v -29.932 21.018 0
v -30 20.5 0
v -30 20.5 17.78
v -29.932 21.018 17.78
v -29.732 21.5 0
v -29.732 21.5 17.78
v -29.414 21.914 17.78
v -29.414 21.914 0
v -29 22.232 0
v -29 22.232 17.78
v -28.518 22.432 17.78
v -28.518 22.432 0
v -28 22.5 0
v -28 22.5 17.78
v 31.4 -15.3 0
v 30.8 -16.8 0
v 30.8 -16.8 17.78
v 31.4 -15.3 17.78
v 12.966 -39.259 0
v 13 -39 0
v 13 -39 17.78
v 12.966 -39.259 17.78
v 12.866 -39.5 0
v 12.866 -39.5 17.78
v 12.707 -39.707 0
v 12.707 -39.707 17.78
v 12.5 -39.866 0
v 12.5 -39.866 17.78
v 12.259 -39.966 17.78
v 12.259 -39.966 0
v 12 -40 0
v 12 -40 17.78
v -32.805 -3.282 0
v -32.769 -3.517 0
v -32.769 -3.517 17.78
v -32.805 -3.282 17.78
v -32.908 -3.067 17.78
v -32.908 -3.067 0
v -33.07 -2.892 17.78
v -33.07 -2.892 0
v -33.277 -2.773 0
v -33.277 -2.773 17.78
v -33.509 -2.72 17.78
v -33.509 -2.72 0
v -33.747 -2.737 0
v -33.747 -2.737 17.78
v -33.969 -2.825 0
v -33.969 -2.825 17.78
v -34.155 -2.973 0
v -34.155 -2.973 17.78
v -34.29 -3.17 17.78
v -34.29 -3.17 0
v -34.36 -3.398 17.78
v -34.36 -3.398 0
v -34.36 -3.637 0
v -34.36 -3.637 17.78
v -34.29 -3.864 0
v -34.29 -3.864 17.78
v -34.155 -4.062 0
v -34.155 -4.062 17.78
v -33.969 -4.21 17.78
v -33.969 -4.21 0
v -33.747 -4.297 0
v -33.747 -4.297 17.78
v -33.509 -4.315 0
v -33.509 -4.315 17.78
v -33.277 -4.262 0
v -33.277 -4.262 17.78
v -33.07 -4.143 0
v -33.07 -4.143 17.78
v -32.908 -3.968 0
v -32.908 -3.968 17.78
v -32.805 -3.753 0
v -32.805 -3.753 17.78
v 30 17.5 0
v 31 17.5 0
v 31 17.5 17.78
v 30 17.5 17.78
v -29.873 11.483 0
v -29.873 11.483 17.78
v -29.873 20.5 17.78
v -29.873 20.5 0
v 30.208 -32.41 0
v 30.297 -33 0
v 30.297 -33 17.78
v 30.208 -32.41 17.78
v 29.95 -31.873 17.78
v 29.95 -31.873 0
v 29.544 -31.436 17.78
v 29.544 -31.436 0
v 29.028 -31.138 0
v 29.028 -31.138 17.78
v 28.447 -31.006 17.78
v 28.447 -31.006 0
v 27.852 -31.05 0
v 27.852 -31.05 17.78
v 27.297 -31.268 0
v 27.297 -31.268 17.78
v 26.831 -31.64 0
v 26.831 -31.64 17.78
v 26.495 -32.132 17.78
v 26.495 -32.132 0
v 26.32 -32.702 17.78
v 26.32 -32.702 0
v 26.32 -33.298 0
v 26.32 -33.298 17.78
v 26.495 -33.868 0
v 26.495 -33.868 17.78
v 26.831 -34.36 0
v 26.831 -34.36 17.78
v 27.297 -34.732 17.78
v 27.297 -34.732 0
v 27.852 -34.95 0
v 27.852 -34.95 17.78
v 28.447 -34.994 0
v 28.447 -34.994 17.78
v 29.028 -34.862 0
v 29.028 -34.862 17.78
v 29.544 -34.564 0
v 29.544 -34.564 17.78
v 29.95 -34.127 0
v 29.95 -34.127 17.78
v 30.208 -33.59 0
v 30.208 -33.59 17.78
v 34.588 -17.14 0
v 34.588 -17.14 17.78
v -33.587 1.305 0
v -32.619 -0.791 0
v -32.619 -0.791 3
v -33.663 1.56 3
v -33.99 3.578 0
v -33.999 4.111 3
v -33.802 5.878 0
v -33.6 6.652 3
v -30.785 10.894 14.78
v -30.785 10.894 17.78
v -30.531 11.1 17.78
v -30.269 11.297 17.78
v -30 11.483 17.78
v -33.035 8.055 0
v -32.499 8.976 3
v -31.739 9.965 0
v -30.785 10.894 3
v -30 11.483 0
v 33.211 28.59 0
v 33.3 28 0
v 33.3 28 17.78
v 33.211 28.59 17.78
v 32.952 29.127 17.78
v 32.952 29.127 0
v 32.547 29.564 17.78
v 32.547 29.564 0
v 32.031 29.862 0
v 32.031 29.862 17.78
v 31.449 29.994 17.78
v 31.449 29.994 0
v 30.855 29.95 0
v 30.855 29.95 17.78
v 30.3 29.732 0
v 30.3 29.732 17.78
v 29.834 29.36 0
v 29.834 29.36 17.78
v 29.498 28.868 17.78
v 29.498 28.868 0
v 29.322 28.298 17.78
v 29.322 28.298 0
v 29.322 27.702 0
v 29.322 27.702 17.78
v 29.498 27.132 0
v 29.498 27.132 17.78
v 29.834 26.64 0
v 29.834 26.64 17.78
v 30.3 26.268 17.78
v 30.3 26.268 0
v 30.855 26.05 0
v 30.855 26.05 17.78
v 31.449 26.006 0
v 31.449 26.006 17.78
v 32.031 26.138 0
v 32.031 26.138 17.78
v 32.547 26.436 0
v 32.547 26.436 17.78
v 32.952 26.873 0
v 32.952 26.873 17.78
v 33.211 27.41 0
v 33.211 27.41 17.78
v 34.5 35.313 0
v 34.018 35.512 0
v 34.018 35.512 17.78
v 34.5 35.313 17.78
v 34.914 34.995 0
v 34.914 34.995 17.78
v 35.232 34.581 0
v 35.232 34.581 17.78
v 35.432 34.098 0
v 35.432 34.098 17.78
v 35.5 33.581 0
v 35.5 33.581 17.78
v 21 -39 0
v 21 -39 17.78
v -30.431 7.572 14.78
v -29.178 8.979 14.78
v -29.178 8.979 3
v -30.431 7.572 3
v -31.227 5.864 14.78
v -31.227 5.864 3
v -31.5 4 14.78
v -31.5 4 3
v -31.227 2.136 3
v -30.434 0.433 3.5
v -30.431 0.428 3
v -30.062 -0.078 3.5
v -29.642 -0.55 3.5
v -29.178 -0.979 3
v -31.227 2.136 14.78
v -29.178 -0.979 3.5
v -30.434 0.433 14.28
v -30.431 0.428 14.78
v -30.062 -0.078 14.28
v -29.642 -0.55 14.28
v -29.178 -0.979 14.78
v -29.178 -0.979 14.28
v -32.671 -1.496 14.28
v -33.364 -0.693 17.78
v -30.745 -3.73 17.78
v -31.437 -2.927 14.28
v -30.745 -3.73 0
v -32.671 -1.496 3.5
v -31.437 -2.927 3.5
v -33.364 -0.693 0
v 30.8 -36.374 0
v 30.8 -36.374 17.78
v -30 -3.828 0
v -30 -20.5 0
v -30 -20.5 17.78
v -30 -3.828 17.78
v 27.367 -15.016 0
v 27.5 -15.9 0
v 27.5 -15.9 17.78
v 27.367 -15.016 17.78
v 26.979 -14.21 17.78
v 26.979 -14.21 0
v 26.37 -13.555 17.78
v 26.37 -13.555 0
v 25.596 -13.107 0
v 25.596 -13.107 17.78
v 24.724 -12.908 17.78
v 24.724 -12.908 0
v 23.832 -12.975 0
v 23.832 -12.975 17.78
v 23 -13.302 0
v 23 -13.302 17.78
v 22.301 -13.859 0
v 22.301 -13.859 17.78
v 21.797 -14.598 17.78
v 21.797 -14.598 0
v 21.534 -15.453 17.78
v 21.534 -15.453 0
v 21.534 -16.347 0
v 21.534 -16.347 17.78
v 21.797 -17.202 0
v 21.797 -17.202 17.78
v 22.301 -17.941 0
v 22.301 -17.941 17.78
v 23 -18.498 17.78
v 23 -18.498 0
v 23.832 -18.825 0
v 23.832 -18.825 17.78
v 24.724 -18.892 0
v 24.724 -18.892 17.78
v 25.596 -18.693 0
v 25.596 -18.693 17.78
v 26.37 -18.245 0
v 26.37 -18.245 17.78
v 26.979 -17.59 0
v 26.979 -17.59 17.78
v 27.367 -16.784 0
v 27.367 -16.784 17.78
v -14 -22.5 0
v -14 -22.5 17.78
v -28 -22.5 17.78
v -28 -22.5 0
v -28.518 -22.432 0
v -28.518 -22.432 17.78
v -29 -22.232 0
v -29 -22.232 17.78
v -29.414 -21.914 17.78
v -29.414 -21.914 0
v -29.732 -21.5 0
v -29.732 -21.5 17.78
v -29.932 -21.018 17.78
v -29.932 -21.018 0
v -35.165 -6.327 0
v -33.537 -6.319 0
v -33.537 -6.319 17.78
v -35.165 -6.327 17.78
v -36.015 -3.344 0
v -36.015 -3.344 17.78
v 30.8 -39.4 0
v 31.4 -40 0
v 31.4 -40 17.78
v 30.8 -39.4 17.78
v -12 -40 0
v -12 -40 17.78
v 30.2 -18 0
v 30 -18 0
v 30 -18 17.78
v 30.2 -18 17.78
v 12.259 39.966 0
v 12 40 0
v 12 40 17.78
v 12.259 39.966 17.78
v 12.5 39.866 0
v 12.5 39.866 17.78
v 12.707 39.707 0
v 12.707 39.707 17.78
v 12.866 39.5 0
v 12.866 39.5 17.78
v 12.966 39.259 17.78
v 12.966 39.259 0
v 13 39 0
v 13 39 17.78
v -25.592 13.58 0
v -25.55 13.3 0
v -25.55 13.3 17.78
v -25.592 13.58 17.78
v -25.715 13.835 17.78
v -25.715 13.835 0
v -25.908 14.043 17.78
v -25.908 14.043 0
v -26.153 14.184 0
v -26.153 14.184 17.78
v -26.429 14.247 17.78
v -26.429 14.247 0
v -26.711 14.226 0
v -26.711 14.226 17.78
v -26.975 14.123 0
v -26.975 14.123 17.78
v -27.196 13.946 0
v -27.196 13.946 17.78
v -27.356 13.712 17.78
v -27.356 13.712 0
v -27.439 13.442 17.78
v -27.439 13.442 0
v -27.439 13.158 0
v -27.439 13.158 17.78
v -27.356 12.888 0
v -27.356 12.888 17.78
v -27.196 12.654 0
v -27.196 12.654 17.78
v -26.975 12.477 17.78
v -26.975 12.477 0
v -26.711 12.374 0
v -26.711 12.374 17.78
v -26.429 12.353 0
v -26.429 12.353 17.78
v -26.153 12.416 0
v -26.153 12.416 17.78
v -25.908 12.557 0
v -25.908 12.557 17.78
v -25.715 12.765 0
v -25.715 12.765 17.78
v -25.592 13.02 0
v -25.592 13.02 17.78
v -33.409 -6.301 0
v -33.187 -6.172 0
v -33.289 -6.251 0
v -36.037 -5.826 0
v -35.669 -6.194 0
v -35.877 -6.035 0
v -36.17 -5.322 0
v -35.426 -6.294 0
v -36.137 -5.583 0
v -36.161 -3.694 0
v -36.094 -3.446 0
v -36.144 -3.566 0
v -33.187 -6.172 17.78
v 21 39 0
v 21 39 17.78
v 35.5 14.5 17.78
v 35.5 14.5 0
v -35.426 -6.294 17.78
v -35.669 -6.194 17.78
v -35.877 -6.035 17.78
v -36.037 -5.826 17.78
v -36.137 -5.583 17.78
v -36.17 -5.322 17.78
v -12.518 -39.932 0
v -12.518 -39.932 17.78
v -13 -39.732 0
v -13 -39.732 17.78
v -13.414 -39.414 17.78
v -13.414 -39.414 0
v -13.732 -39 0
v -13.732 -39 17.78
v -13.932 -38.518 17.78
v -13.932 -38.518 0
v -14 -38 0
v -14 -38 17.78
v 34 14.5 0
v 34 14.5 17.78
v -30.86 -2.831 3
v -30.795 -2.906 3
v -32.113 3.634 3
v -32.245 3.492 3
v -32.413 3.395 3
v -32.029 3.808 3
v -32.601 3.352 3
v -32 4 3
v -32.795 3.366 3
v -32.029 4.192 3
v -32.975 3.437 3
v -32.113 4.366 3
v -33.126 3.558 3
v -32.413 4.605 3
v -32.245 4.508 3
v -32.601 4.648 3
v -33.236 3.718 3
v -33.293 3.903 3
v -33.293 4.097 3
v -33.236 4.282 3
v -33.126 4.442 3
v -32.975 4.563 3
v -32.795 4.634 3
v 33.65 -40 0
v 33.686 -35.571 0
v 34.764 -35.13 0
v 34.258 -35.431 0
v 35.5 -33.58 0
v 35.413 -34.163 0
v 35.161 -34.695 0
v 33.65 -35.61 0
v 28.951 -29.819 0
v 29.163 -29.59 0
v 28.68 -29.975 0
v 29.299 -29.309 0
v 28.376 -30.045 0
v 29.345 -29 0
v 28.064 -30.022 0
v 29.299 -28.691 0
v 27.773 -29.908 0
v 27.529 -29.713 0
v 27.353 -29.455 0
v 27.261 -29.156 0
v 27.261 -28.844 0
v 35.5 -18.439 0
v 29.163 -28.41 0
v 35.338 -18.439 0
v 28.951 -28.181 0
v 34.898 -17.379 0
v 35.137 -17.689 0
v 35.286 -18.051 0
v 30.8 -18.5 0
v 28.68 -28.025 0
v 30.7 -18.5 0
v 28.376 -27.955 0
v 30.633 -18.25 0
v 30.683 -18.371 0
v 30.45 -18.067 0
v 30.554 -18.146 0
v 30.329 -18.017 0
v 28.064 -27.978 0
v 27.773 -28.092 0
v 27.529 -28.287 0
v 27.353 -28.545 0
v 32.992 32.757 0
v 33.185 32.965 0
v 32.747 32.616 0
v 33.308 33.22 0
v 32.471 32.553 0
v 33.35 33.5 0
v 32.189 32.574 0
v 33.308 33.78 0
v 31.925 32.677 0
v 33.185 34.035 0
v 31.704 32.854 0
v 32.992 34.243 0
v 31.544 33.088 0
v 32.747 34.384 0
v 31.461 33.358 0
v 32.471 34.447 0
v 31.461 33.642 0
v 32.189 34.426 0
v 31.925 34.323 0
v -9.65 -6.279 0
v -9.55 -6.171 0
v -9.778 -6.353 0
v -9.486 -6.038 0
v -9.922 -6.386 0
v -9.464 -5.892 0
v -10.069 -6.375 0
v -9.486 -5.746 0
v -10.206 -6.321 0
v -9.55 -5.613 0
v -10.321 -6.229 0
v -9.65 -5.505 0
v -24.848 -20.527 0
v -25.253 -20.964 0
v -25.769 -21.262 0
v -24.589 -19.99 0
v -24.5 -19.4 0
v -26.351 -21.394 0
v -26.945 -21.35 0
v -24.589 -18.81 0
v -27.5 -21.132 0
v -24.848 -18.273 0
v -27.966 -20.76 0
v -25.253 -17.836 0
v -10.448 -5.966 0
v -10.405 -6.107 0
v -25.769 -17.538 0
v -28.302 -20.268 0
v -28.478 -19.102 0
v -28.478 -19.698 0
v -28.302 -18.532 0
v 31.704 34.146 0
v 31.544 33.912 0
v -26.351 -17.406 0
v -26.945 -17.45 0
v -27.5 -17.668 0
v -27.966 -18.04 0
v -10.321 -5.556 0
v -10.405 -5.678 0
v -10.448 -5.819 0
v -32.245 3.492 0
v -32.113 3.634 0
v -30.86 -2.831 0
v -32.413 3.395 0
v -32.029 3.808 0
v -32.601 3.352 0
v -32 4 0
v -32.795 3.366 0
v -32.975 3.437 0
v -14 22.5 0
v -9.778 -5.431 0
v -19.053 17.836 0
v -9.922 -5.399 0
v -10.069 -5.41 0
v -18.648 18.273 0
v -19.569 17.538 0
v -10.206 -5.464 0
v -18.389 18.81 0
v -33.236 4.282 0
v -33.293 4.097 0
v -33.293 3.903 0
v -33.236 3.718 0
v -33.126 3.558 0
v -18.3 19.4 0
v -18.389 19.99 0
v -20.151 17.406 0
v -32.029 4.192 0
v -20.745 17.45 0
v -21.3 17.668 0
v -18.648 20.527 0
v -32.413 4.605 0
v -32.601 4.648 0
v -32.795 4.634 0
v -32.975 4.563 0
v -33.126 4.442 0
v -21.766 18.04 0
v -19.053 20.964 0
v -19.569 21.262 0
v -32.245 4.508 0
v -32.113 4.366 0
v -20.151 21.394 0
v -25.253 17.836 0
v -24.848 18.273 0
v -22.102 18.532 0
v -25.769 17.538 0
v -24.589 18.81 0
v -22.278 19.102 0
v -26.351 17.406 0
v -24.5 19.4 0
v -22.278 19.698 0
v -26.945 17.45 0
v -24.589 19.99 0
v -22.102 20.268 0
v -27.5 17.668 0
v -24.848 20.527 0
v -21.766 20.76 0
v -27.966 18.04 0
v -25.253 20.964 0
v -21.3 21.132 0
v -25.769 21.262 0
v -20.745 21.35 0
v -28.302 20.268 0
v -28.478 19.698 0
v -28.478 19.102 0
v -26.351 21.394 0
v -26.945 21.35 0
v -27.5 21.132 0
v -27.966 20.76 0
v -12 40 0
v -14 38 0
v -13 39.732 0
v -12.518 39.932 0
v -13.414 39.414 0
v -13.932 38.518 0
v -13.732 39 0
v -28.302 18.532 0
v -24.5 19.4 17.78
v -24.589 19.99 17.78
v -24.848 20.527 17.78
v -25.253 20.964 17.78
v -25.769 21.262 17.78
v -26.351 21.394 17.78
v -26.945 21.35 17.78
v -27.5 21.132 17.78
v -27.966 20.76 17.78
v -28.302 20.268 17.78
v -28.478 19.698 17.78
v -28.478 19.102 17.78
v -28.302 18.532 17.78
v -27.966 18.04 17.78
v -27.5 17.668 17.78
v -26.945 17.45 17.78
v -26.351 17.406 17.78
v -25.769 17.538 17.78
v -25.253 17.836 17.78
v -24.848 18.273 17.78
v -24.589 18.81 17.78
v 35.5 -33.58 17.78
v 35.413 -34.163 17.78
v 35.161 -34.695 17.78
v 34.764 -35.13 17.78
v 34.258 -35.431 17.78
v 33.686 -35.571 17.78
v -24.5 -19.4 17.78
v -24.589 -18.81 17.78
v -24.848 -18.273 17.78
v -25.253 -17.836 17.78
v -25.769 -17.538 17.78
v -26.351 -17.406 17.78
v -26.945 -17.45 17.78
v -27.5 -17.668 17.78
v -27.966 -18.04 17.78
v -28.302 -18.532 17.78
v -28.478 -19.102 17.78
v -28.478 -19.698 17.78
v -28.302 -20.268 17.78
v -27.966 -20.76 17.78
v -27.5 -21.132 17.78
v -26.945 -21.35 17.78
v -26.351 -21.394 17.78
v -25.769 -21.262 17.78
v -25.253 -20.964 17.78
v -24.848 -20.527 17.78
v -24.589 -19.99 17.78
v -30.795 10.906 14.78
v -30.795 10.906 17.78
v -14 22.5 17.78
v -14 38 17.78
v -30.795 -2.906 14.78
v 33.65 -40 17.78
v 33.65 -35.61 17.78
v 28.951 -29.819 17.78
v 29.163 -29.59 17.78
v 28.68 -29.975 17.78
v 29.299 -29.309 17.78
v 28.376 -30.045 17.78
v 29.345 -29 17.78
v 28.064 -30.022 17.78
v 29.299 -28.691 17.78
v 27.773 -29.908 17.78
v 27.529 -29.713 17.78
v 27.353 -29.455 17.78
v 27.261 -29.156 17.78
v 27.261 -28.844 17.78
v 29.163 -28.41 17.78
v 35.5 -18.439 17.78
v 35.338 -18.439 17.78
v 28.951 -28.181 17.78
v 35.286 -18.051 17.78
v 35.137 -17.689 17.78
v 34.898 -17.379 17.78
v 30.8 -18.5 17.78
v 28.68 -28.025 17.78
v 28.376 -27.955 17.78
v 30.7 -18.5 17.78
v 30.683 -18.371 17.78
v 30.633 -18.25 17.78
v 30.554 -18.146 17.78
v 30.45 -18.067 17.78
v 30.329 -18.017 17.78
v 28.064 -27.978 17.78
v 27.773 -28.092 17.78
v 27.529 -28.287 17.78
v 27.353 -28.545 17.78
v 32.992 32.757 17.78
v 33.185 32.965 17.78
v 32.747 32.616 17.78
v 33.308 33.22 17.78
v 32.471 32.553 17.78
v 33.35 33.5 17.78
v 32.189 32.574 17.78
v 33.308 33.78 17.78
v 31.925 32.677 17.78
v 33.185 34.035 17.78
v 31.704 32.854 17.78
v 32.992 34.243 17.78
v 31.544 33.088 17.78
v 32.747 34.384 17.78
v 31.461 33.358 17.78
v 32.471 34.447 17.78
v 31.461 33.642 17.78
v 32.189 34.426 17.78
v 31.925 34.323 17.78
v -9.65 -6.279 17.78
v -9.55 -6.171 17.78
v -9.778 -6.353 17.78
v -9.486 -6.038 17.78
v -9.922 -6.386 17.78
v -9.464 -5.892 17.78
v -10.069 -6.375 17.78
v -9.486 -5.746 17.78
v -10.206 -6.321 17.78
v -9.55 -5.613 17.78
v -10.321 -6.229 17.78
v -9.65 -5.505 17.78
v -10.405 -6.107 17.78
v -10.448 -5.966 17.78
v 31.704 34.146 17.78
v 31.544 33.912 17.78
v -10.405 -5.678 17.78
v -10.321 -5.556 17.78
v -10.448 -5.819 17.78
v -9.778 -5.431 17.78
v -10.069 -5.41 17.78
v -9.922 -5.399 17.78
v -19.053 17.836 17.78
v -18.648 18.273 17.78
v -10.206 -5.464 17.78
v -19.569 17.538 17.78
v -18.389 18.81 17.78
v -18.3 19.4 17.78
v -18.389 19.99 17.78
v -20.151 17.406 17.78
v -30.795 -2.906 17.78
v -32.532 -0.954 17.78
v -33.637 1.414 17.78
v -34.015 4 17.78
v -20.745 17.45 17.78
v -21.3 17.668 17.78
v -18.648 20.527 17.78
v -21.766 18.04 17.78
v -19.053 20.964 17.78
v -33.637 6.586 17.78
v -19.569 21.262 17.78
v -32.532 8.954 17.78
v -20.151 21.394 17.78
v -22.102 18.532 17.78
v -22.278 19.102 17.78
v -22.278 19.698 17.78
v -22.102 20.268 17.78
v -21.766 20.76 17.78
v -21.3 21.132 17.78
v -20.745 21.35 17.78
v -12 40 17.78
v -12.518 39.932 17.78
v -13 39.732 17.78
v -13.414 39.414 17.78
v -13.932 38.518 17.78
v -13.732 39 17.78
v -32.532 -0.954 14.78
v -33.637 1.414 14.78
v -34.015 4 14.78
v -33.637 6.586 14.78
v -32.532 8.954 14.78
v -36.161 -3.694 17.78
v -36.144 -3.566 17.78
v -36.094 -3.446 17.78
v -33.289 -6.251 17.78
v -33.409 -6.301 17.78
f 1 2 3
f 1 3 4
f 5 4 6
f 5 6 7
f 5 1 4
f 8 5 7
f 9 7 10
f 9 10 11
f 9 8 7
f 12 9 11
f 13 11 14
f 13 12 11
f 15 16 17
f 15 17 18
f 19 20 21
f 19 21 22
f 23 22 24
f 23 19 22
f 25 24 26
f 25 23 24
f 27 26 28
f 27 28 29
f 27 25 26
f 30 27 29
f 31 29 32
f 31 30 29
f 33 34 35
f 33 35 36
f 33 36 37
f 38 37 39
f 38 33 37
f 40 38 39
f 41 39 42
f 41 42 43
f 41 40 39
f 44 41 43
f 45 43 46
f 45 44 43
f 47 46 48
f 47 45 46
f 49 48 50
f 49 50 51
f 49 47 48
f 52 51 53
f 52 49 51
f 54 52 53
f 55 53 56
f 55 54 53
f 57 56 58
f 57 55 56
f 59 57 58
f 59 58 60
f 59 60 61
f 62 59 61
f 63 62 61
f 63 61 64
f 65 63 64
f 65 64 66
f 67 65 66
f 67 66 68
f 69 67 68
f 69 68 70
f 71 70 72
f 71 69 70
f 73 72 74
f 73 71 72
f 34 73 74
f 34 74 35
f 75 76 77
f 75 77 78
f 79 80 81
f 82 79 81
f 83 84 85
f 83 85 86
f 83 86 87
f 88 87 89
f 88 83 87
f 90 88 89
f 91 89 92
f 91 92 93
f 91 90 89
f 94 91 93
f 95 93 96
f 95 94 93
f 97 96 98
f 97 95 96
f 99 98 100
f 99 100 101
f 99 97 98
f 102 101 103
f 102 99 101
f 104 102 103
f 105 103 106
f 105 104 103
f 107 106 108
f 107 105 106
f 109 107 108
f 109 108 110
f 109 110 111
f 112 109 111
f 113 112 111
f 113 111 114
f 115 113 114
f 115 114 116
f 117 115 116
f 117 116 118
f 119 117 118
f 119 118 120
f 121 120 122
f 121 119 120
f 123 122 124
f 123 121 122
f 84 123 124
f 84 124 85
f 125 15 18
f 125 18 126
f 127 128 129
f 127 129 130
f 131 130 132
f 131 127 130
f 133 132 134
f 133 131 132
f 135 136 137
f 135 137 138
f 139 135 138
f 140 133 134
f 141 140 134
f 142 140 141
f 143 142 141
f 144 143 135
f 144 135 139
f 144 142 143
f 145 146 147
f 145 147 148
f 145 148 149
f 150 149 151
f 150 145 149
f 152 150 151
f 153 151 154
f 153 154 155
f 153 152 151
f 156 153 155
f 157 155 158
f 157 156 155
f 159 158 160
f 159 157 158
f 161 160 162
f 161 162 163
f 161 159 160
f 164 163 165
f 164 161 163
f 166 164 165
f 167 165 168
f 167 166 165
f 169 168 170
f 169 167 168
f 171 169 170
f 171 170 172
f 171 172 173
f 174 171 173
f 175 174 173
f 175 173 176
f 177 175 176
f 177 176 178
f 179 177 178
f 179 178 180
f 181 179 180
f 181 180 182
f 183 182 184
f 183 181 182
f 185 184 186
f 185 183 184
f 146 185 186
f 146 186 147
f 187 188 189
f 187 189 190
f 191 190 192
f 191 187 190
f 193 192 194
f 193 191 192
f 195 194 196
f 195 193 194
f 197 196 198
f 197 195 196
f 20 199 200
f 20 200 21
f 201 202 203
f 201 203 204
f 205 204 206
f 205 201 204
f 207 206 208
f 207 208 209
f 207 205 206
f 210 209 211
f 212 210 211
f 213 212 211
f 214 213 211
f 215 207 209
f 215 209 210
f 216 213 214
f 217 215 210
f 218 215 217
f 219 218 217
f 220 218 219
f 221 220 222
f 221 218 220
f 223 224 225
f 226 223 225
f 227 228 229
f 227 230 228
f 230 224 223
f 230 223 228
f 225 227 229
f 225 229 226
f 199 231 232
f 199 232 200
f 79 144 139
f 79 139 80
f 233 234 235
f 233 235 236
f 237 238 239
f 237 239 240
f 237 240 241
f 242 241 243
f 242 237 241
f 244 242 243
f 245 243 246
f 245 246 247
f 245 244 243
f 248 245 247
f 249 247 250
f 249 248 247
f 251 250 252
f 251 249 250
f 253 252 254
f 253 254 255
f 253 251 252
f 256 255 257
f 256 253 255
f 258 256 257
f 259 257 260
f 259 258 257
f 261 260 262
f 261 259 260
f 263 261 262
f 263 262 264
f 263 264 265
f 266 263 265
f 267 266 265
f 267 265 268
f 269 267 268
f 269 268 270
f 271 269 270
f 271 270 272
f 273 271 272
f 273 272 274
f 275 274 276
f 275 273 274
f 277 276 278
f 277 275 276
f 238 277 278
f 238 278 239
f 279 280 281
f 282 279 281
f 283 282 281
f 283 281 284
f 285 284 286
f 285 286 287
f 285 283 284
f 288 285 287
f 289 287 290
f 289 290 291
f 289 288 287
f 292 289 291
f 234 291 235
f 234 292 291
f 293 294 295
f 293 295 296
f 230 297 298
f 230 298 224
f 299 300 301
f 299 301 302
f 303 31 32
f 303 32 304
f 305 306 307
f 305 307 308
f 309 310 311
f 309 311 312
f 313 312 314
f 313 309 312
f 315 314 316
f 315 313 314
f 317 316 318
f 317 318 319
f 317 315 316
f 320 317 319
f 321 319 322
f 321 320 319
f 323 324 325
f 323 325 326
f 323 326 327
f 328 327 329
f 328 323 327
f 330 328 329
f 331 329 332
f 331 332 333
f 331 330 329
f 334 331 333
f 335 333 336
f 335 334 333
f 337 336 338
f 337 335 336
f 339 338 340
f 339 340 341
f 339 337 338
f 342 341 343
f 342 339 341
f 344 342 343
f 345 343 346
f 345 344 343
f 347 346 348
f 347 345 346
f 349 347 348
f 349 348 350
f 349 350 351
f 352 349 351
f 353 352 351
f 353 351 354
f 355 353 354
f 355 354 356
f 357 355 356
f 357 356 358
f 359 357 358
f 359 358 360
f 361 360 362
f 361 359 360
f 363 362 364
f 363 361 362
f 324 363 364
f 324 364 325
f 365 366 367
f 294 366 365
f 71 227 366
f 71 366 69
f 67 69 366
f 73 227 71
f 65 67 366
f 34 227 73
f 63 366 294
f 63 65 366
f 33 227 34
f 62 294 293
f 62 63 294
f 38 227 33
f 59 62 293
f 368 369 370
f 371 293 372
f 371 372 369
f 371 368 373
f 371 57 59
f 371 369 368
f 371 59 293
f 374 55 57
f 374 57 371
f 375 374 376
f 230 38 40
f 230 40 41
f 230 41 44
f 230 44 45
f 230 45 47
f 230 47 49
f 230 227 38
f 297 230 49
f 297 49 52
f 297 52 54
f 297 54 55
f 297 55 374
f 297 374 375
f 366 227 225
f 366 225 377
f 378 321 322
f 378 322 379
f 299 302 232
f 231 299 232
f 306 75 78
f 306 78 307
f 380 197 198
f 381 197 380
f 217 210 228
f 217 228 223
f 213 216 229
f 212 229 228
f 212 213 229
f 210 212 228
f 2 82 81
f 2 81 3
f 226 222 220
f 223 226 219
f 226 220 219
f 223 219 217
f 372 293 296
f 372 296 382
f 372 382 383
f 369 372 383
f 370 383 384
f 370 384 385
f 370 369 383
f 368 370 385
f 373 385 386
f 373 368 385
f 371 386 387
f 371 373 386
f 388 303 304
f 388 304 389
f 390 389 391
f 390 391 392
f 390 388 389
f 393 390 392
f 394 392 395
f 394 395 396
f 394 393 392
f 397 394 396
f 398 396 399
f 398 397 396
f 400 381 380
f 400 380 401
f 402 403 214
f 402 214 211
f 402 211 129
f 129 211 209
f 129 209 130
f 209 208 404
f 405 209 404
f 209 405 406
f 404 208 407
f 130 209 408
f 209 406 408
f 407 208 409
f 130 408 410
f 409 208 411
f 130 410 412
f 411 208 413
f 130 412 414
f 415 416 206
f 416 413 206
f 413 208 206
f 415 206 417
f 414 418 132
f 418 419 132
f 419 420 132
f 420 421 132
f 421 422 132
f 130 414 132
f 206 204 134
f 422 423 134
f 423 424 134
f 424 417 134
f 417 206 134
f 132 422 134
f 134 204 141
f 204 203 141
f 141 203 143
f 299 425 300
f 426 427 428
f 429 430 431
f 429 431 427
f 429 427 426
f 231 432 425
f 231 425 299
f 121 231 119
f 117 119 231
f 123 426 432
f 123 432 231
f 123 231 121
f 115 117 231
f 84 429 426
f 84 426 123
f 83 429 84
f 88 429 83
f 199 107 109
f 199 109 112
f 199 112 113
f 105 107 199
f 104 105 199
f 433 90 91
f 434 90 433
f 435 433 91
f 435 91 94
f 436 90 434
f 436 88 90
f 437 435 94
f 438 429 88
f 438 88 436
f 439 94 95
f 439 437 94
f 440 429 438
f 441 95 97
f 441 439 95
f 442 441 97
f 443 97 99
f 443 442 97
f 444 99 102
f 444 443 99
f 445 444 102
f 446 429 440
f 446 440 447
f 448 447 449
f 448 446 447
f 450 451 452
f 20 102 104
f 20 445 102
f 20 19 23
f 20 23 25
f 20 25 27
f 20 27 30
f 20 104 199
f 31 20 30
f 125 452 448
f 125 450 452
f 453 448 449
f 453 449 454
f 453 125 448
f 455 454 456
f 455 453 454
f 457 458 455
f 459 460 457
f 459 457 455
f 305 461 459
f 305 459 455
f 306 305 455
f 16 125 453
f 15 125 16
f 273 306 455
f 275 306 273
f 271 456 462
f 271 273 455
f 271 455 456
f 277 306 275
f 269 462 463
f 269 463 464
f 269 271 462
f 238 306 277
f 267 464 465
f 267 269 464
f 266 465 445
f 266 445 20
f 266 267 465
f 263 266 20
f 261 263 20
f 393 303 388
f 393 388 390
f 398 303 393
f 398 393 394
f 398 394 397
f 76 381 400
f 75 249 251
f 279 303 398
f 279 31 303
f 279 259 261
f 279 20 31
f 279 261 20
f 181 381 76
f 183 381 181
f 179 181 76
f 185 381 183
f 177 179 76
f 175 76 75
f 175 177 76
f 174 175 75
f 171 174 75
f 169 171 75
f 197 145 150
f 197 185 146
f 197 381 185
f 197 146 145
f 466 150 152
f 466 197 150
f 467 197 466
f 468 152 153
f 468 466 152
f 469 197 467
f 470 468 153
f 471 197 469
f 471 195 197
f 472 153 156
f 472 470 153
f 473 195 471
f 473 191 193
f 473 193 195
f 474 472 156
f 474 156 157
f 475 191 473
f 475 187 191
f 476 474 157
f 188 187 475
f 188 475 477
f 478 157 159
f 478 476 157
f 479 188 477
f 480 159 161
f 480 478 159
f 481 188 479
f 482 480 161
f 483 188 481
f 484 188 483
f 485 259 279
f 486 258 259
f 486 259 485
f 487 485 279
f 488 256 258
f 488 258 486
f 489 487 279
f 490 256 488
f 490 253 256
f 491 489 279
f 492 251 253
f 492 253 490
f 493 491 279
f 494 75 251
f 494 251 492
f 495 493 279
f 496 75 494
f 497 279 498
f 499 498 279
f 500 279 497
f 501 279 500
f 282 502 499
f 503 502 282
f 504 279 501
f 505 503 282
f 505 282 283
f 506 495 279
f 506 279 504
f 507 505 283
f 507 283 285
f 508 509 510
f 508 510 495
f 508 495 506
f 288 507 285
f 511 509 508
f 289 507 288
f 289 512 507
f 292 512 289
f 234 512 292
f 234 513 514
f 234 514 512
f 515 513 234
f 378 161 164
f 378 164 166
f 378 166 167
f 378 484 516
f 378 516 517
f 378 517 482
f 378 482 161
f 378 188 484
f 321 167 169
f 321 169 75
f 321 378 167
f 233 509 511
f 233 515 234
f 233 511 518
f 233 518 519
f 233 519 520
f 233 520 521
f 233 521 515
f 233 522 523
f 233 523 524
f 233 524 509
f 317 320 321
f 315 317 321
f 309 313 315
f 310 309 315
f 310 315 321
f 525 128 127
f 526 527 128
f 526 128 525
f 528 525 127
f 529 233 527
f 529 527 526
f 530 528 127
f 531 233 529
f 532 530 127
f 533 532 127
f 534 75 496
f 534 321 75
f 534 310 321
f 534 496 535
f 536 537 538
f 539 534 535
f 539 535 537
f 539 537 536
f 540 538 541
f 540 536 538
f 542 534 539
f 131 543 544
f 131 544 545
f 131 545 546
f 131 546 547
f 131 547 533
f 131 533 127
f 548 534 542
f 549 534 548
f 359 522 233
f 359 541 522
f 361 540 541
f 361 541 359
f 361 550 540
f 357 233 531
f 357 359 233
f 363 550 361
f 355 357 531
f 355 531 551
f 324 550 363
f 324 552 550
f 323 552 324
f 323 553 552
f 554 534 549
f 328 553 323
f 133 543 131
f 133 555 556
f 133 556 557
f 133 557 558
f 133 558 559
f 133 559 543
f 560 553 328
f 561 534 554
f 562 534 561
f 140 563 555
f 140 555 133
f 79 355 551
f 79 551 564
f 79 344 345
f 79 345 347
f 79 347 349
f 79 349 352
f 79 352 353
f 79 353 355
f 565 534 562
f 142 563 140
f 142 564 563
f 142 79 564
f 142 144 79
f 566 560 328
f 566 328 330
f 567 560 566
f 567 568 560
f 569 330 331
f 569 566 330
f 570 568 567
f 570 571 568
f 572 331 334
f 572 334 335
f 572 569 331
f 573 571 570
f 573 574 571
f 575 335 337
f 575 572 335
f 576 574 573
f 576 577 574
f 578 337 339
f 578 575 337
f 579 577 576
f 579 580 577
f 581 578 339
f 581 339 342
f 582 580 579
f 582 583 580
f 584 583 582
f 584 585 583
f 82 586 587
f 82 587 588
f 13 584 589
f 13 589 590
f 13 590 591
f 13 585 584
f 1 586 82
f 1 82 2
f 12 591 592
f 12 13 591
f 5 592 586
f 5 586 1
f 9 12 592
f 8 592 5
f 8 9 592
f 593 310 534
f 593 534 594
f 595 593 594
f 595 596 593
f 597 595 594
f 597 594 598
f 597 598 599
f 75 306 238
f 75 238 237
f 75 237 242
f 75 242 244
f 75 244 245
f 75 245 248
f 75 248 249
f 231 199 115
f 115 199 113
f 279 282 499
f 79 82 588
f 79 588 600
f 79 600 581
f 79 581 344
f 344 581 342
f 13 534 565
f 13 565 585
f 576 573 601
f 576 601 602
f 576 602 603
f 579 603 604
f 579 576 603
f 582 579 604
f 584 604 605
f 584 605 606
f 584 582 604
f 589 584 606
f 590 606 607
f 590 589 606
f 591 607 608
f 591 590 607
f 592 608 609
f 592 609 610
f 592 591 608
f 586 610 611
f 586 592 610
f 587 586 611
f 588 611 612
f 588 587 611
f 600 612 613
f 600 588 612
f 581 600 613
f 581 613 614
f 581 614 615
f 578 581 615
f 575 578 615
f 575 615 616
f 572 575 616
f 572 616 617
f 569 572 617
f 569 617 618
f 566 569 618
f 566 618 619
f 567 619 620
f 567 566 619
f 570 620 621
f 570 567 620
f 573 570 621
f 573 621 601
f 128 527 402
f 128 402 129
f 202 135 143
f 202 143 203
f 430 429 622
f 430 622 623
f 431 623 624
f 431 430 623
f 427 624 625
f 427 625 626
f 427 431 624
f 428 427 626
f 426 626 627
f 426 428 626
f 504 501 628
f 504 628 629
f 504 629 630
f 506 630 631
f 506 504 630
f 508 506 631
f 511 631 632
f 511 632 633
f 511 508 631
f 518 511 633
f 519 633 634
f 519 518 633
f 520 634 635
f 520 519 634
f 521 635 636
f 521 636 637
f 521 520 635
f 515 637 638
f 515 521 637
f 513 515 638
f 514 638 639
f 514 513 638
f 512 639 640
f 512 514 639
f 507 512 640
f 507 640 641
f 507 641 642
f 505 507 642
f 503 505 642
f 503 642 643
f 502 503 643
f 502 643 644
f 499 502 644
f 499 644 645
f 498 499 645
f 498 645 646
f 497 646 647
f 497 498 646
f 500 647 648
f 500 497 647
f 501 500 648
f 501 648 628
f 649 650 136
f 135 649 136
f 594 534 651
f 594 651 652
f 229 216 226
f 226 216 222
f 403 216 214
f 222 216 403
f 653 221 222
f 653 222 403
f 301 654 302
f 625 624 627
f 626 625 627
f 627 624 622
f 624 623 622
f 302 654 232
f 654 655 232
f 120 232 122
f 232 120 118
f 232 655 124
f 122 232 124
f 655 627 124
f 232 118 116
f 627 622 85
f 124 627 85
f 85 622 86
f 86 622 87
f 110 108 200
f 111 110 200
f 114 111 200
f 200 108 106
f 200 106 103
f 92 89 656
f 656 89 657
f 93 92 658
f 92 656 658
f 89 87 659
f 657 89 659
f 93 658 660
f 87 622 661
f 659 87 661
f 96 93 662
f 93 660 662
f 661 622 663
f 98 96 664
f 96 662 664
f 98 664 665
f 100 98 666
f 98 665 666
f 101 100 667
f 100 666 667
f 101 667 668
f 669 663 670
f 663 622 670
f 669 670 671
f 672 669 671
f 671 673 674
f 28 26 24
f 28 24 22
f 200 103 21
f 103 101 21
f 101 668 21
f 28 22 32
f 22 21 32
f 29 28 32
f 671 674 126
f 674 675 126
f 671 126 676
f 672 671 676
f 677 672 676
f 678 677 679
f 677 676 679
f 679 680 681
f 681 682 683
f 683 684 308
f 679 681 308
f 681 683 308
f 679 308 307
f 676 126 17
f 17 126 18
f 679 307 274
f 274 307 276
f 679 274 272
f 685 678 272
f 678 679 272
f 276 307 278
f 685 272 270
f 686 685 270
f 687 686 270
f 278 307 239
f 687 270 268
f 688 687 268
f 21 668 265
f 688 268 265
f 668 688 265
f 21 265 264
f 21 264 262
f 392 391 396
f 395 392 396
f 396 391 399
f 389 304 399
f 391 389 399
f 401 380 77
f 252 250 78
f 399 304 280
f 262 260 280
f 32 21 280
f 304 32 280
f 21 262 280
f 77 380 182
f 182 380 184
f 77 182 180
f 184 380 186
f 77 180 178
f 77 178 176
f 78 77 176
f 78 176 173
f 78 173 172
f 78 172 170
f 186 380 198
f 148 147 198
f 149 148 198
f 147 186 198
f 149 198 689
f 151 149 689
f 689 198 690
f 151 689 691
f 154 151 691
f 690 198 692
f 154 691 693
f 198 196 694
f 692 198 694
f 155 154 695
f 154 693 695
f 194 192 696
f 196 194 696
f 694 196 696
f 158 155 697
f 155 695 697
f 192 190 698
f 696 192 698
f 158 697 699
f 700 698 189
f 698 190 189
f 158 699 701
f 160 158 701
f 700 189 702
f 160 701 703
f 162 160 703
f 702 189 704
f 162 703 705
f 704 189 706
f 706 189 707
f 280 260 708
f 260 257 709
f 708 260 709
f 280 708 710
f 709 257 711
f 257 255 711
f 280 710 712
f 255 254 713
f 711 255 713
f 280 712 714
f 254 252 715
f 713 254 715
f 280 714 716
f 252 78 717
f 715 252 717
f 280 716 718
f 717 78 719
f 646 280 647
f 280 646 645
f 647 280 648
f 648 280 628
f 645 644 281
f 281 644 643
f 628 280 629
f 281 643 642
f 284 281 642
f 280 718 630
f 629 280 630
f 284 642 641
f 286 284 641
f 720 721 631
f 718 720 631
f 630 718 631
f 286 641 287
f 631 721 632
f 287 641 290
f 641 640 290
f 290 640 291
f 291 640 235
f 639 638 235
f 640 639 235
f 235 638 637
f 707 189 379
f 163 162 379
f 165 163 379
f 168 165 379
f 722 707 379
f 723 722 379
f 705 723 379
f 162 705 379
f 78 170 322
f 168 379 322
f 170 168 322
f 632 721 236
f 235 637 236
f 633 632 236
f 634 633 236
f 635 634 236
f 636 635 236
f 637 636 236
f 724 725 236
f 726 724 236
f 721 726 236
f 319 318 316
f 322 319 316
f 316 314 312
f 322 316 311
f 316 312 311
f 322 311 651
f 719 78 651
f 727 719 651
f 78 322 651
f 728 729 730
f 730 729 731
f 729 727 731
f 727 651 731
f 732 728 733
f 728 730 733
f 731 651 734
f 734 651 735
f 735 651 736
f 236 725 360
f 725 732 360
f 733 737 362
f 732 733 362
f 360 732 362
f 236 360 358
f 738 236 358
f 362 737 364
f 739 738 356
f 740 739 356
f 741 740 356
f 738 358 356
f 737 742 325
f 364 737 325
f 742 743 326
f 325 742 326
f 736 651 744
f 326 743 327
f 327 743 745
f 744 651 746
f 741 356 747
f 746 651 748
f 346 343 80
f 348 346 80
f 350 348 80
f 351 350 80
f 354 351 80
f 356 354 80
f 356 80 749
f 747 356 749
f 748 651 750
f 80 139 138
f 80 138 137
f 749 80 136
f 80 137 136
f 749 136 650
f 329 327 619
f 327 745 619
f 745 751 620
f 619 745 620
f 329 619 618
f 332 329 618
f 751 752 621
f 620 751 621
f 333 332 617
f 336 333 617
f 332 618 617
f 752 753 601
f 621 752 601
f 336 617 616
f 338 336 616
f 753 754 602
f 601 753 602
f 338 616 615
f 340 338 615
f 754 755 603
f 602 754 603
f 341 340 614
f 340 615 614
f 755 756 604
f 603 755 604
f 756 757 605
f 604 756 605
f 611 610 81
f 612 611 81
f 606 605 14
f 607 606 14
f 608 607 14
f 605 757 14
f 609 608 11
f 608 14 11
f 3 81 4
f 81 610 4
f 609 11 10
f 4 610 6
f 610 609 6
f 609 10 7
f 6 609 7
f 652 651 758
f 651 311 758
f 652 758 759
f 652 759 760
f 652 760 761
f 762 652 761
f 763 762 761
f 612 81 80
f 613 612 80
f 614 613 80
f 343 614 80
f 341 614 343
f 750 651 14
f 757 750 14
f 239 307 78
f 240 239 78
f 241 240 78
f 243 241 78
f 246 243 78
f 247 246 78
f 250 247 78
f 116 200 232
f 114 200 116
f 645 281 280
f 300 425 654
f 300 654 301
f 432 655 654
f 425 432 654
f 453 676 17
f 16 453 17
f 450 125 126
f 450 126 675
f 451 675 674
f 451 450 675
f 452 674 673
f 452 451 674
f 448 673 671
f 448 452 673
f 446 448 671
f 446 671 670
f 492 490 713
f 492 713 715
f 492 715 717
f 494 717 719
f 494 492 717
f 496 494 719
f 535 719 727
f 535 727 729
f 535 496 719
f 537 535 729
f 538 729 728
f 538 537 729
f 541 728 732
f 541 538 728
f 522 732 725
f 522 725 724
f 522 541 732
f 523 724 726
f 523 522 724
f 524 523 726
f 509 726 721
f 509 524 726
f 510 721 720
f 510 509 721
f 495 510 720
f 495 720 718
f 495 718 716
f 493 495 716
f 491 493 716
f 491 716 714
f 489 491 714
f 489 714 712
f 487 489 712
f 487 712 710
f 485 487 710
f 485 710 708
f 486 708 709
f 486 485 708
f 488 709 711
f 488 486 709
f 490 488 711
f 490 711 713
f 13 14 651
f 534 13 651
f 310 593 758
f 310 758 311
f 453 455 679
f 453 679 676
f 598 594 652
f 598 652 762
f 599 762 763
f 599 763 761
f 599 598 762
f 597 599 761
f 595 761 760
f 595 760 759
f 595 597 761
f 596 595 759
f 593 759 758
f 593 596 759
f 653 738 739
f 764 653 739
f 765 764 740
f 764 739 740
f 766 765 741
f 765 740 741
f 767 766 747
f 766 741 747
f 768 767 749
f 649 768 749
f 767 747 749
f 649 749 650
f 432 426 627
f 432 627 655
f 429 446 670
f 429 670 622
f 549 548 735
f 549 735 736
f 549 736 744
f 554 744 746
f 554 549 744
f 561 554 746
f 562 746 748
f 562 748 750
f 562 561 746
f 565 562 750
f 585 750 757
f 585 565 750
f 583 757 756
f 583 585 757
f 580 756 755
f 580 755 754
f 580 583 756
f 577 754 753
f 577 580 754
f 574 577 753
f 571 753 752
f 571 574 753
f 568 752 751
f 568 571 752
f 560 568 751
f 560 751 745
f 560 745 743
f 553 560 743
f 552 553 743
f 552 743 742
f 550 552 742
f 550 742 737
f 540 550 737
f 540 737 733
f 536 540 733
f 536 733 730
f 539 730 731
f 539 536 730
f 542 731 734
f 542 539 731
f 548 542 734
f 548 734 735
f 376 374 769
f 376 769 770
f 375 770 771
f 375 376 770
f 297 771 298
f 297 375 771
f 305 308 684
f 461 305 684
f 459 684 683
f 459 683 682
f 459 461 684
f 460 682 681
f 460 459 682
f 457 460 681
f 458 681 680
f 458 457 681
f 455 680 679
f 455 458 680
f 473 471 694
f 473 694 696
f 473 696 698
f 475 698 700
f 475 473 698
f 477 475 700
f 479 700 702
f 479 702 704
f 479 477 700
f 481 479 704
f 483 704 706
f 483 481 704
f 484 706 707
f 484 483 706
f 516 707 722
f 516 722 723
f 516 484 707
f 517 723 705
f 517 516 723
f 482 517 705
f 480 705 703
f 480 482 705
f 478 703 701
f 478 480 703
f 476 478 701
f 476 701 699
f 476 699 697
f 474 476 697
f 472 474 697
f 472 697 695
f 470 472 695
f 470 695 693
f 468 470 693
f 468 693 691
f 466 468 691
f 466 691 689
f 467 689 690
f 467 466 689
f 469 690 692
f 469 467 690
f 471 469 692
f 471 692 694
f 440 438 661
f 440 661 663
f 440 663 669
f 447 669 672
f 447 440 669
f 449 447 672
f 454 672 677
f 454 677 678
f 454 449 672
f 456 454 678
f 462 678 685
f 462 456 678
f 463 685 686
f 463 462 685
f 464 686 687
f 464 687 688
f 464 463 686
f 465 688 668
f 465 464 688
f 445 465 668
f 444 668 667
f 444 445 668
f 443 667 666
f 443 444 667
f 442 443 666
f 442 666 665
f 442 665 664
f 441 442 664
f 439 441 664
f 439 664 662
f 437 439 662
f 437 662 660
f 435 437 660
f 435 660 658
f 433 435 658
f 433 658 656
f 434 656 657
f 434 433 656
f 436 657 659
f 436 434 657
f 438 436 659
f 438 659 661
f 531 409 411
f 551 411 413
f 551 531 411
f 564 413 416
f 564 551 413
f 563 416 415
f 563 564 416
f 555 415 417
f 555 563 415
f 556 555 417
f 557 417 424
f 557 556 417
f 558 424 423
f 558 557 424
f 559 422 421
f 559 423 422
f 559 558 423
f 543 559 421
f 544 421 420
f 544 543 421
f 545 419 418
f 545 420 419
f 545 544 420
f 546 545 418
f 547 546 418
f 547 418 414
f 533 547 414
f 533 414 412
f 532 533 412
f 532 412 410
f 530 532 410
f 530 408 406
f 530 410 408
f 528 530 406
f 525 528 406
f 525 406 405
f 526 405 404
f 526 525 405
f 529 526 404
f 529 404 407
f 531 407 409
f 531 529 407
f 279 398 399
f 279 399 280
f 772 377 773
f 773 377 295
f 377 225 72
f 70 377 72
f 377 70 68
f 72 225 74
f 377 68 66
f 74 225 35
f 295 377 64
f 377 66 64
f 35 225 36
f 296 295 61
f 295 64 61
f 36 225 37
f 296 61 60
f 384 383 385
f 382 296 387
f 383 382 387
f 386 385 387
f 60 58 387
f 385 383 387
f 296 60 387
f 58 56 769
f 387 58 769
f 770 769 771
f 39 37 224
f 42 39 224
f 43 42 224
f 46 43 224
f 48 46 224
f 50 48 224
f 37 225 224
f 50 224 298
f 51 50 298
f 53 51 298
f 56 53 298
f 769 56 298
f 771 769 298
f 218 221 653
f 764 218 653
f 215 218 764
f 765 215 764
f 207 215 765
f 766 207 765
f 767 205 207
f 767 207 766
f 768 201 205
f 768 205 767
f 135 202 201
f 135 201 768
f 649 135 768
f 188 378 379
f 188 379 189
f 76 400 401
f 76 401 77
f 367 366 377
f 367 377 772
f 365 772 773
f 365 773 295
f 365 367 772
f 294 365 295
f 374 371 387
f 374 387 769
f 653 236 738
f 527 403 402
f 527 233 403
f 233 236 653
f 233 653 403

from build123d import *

# Parameters (mm, degrees)
SKETCH1_R           = 0.95
SKETCH1_R_2         = 2
SKETCH1_R_3         = 3
SKETCH1_R_4         = 1.047925013
SKETCH1_R_5         = 0.495
SKETCH1_R_6         = 0.65
BOSS_EXTRUDE1_DEPTH = 17.78
CUT_EXTRUDE1_DEPTH  = 14.78
BOSS_EXTRUDE2_DEPTH = 3
SKETCH4_W           = 10.78
SKETCH4_H           = 1.889736425
CUT_EXTRUDE2_DEPTH  = 2.5
SKETCH5_W           = 10.78
SKETCH5_H           = 1.889736425
BOSS_EXTRUDE3_DEPTH = 3
SKETCH6_R           = 0.8
BOSS_EXTRUDE4_DEPTH = 17.78


with BuildPart() as part:
    # Sketch1 → Boss-Extrude1 (new body)
    with BuildSketch(Plane.XY):
        with BuildLine():
            Line((35.5, 14.5), (34, 14.5))
            Line((34, 14.5), (31, 17.5))
            Line((31, 17.5), (30, 17.5))
            Line((30, 17.5), (30, -18))
            Line((30, -18), (30.2, -18))
            ThreePointArc((30.2, -18), (30.553553391, -18.146446609), (30.7, -18.5))
            Line((30.7, -18.5), (30.8, -18.5))
            Line((30.8, -18.5), (30.8, -16.8))
            Line((30.8, -16.8), (31.4, -15.3))
            Line((31.4, -15.3), (34.5875, -17.140303983))
            ThreePointArc((34.5875, -17.140303983), (35.136538106, -17.689342089), (35.3375, -18.439342089))
            Line((35.3375, -18.439342089), (35.5, -18.439342089))
            Line((35.5, -18.439342089), (35.5, -33.580082734))
            ThreePointArc((35.5, -33.580082734), (34.978350458, -34.92710906), (33.685520077, -35.57145972))
            Line((33.685520077, -35.57145972), (33.65, -35.610442716))
            Line((33.65, -35.610442716), (33.65, -40))
            Line((33.65, -40), (31.4, -40))
            Line((31.4, -40), (30.8, -39.4))
            Line((30.8, -39.4), (30.8, -36.374097914))
            Line((30.8, -36.374097914), (21, -39))
            Line((21, -39), (13, -39))
            ThreePointArc((13, -39), (12.707106781, -39.707106781), (12, -40))
            Line((12, -40), (-12, -40))
            ThreePointArc((-12, -40), (-13.414213562, -39.414213562), (-14, -38))
            Line((-14, -38), (-14, -22.5))
            Line((-14, -22.5), (-28, -22.5))
            ThreePointArc((-28, -22.5), (-29.414213562, -21.914213562), (-30, -20.5))
            Line((-30, -20.5), (-30, -3.828427125))
            Line((-30, -3.828427125), (-30.86027165, -2.830608771))
            Line((-30.86027165, -2.830608771), (-32.619050385, -0.790623261))
            ThreePointArc((-32.619050385, -0.790623261), (-33.80184622, 5.878164829), (-30, 11.483314774))
            Line((-30, 11.483314774), (-29.873, 11.483314774))
            Line((-29.873, 11.483314774), (-29.873, 20.5))
            Line((-29.873, 20.5), (-30, 20.5))
            ThreePointArc((-30, 20.5), (-29.414213562, 21.914213562), (-28, 22.5))
            Line((-28, 22.5), (-14, 22.5))
            Line((-14, 22.5), (-14, 38))
            ThreePointArc((-14, 38), (-13.414213562, 39.414213562), (-12, 40))
            Line((-12, 40), (12, 40))
            ThreePointArc((12, 40), (12.707106781, 39.707106781), (13, 39))
            Line((13, 39), (21, 39))
            Line((21, 39), (34.017568937, 35.512452349))
            ThreePointArc((34.017568937, 35.512452349), (35.086684889, 34.798133425), (35.5, 33.580582168))
            Line((35.5, 33.580582168), (35.5, 14.5))
        make_face()
        with Locations((32.4, 33.5)):
            Circle(SKETCH1_R, mode=Mode.SUBTRACT)
        with Locations((31.3, 28)):
            Circle(SKETCH1_R_2, mode=Mode.SUBTRACT)
        with Locations((24.5, -15.9)):
            Circle(SKETCH1_R_3, mode=Mode.SUBTRACT)
        with Locations((28.297263495, -29)):
            Circle(SKETCH1_R_4, mode=Mode.SUBTRACT)
        with Locations((28.297263495, -33)):
            Circle(SKETCH1_R_2, mode=Mode.SUBTRACT)
        with Locations((-26.5, -19.4)):
            Circle(SKETCH1_R_2, mode=Mode.SUBTRACT)
        with Locations((-9.958595339, -5.892279985)):
            Circle(SKETCH1_R_5, mode=Mode.SUBTRACT)
        with Locations((-32.65, 4)):
            Circle(SKETCH1_R_6, mode=Mode.SUBTRACT)
        with Locations((-26.5, 13.3)):
            Circle(SKETCH1_R, mode=Mode.SUBTRACT)
        with Locations((-26.5, 19.4)):
            Circle(SKETCH1_R_2, mode=Mode.SUBTRACT)
        with Locations((-20.3, 19.4)):
            Circle(SKETCH1_R_2, mode=Mode.SUBTRACT)
    extrude(amount=BOSS_EXTRUDE1_DEPTH)

    # Sketch2 → Cut-Extrude1 (cut)
    with BuildSketch(Plane.XY.offset(17.78)):
        with BuildLine():
            Line((-31.427876097, 11.660444431), (-29.178119463, 8.97928888))
            ThreePointArc((-29.178119463, 8.97928888), (-31.5, 4), (-29.178119463, -0.97928888))
            Line((-29.178119463, -0.97928888), (-31.427876097, -3.660444431))
            ThreePointArc((-31.427876097, -3.660444431), (-35, 4), (-31.427876097, 11.660444431))
        make_face()
    extrude(amount=-CUT_EXTRUDE1_DEPTH, mode=Mode.SUBTRACT)

    # Sketch3 → Boss-Extrude2 (add)
    with BuildSketch(Plane.XY.offset(17.78)):
        with BuildLine():
            Line((-29.178119463, -0.97928888), (-30.795044426, -2.906265014))
            ThreePointArc((-30.795044426, -2.906265014), (-34.015488692, 4), (-30.795044426, 10.906265014))
            Line((-30.795044426, 10.906265014), (-29.178119463, 8.97928888))
            ThreePointArc((-29.178119463, 8.97928888), (-31.5, 4), (-29.178119463, -0.97928888))
        make_face()
    extrude(amount=-BOSS_EXTRUDE2_DEPTH)

    # Sketch4 → Cut-Extrude2 (cut)
    with BuildSketch(Plane(origin=(-19.102021317, -16.468856625, 0), x_dir=(0, 0, 1), z_dir=(-0.757378649, -0.652975943, 0))):
        with Locations((8.89, 19.255785792)):
            Rectangle(SKETCH4_W, SKETCH4_H)
    extrude(amount=-CUT_EXTRUDE2_DEPTH, mode=Mode.SUBTRACT)

    # Sketch5 → Boss-Extrude3 (add)
    with BuildSketch(Plane(origin=(-17.208574695, -14.836416768, 0), x_dir=(0, 0, 1), z_dir=(-0.757378649, -0.652975943, 0))):
        with Locations((8.89, 19.255785792)):
            Rectangle(SKETCH5_W, SKETCH5_H)
    extrude(amount=BOSS_EXTRUDE3_DEPTH)

    # Sketch6 → Boss-Extrude4 (add)
    with BuildSketch(Plane.XY):
        with BuildLine():
            Line((-33.363800719, -0.692521635), (-30.744750334, -3.730325499))
            Line((-30.744750334, -3.730325499), (-33.186517311, -6.172092477))
            ThreePointArc((-33.186517311, -6.172092477), (-33.347465178, -6.279953339), (-33.53733329, -6.318531593))
            Line((-33.53733329, -6.318531593), (-35.164834129, -6.327442008))
            ThreePointArc((-35.164834129, -6.327442008), (-35.877415735, -6.034563776), (-36.170293967, -5.32198217))
            Line((-36.170293967, -5.32198217), (-36.161383552, -3.69448133))
            ThreePointArc((-36.161383552, -3.69448133), (-36.122805298, -3.504613219), (-36.014944436, -3.343665352))
            Line((-36.014944436, -3.343665352), (-33.363800719, -0.692521635))
        make_face()
        with Locations((-33.569032824, -3.517375453)):
            Circle(SKETCH6_R, mode=Mode.SUBTRACT)
    extrude(amount=BOSS_EXTRUDE4_DEPTH)


solid = part.part
